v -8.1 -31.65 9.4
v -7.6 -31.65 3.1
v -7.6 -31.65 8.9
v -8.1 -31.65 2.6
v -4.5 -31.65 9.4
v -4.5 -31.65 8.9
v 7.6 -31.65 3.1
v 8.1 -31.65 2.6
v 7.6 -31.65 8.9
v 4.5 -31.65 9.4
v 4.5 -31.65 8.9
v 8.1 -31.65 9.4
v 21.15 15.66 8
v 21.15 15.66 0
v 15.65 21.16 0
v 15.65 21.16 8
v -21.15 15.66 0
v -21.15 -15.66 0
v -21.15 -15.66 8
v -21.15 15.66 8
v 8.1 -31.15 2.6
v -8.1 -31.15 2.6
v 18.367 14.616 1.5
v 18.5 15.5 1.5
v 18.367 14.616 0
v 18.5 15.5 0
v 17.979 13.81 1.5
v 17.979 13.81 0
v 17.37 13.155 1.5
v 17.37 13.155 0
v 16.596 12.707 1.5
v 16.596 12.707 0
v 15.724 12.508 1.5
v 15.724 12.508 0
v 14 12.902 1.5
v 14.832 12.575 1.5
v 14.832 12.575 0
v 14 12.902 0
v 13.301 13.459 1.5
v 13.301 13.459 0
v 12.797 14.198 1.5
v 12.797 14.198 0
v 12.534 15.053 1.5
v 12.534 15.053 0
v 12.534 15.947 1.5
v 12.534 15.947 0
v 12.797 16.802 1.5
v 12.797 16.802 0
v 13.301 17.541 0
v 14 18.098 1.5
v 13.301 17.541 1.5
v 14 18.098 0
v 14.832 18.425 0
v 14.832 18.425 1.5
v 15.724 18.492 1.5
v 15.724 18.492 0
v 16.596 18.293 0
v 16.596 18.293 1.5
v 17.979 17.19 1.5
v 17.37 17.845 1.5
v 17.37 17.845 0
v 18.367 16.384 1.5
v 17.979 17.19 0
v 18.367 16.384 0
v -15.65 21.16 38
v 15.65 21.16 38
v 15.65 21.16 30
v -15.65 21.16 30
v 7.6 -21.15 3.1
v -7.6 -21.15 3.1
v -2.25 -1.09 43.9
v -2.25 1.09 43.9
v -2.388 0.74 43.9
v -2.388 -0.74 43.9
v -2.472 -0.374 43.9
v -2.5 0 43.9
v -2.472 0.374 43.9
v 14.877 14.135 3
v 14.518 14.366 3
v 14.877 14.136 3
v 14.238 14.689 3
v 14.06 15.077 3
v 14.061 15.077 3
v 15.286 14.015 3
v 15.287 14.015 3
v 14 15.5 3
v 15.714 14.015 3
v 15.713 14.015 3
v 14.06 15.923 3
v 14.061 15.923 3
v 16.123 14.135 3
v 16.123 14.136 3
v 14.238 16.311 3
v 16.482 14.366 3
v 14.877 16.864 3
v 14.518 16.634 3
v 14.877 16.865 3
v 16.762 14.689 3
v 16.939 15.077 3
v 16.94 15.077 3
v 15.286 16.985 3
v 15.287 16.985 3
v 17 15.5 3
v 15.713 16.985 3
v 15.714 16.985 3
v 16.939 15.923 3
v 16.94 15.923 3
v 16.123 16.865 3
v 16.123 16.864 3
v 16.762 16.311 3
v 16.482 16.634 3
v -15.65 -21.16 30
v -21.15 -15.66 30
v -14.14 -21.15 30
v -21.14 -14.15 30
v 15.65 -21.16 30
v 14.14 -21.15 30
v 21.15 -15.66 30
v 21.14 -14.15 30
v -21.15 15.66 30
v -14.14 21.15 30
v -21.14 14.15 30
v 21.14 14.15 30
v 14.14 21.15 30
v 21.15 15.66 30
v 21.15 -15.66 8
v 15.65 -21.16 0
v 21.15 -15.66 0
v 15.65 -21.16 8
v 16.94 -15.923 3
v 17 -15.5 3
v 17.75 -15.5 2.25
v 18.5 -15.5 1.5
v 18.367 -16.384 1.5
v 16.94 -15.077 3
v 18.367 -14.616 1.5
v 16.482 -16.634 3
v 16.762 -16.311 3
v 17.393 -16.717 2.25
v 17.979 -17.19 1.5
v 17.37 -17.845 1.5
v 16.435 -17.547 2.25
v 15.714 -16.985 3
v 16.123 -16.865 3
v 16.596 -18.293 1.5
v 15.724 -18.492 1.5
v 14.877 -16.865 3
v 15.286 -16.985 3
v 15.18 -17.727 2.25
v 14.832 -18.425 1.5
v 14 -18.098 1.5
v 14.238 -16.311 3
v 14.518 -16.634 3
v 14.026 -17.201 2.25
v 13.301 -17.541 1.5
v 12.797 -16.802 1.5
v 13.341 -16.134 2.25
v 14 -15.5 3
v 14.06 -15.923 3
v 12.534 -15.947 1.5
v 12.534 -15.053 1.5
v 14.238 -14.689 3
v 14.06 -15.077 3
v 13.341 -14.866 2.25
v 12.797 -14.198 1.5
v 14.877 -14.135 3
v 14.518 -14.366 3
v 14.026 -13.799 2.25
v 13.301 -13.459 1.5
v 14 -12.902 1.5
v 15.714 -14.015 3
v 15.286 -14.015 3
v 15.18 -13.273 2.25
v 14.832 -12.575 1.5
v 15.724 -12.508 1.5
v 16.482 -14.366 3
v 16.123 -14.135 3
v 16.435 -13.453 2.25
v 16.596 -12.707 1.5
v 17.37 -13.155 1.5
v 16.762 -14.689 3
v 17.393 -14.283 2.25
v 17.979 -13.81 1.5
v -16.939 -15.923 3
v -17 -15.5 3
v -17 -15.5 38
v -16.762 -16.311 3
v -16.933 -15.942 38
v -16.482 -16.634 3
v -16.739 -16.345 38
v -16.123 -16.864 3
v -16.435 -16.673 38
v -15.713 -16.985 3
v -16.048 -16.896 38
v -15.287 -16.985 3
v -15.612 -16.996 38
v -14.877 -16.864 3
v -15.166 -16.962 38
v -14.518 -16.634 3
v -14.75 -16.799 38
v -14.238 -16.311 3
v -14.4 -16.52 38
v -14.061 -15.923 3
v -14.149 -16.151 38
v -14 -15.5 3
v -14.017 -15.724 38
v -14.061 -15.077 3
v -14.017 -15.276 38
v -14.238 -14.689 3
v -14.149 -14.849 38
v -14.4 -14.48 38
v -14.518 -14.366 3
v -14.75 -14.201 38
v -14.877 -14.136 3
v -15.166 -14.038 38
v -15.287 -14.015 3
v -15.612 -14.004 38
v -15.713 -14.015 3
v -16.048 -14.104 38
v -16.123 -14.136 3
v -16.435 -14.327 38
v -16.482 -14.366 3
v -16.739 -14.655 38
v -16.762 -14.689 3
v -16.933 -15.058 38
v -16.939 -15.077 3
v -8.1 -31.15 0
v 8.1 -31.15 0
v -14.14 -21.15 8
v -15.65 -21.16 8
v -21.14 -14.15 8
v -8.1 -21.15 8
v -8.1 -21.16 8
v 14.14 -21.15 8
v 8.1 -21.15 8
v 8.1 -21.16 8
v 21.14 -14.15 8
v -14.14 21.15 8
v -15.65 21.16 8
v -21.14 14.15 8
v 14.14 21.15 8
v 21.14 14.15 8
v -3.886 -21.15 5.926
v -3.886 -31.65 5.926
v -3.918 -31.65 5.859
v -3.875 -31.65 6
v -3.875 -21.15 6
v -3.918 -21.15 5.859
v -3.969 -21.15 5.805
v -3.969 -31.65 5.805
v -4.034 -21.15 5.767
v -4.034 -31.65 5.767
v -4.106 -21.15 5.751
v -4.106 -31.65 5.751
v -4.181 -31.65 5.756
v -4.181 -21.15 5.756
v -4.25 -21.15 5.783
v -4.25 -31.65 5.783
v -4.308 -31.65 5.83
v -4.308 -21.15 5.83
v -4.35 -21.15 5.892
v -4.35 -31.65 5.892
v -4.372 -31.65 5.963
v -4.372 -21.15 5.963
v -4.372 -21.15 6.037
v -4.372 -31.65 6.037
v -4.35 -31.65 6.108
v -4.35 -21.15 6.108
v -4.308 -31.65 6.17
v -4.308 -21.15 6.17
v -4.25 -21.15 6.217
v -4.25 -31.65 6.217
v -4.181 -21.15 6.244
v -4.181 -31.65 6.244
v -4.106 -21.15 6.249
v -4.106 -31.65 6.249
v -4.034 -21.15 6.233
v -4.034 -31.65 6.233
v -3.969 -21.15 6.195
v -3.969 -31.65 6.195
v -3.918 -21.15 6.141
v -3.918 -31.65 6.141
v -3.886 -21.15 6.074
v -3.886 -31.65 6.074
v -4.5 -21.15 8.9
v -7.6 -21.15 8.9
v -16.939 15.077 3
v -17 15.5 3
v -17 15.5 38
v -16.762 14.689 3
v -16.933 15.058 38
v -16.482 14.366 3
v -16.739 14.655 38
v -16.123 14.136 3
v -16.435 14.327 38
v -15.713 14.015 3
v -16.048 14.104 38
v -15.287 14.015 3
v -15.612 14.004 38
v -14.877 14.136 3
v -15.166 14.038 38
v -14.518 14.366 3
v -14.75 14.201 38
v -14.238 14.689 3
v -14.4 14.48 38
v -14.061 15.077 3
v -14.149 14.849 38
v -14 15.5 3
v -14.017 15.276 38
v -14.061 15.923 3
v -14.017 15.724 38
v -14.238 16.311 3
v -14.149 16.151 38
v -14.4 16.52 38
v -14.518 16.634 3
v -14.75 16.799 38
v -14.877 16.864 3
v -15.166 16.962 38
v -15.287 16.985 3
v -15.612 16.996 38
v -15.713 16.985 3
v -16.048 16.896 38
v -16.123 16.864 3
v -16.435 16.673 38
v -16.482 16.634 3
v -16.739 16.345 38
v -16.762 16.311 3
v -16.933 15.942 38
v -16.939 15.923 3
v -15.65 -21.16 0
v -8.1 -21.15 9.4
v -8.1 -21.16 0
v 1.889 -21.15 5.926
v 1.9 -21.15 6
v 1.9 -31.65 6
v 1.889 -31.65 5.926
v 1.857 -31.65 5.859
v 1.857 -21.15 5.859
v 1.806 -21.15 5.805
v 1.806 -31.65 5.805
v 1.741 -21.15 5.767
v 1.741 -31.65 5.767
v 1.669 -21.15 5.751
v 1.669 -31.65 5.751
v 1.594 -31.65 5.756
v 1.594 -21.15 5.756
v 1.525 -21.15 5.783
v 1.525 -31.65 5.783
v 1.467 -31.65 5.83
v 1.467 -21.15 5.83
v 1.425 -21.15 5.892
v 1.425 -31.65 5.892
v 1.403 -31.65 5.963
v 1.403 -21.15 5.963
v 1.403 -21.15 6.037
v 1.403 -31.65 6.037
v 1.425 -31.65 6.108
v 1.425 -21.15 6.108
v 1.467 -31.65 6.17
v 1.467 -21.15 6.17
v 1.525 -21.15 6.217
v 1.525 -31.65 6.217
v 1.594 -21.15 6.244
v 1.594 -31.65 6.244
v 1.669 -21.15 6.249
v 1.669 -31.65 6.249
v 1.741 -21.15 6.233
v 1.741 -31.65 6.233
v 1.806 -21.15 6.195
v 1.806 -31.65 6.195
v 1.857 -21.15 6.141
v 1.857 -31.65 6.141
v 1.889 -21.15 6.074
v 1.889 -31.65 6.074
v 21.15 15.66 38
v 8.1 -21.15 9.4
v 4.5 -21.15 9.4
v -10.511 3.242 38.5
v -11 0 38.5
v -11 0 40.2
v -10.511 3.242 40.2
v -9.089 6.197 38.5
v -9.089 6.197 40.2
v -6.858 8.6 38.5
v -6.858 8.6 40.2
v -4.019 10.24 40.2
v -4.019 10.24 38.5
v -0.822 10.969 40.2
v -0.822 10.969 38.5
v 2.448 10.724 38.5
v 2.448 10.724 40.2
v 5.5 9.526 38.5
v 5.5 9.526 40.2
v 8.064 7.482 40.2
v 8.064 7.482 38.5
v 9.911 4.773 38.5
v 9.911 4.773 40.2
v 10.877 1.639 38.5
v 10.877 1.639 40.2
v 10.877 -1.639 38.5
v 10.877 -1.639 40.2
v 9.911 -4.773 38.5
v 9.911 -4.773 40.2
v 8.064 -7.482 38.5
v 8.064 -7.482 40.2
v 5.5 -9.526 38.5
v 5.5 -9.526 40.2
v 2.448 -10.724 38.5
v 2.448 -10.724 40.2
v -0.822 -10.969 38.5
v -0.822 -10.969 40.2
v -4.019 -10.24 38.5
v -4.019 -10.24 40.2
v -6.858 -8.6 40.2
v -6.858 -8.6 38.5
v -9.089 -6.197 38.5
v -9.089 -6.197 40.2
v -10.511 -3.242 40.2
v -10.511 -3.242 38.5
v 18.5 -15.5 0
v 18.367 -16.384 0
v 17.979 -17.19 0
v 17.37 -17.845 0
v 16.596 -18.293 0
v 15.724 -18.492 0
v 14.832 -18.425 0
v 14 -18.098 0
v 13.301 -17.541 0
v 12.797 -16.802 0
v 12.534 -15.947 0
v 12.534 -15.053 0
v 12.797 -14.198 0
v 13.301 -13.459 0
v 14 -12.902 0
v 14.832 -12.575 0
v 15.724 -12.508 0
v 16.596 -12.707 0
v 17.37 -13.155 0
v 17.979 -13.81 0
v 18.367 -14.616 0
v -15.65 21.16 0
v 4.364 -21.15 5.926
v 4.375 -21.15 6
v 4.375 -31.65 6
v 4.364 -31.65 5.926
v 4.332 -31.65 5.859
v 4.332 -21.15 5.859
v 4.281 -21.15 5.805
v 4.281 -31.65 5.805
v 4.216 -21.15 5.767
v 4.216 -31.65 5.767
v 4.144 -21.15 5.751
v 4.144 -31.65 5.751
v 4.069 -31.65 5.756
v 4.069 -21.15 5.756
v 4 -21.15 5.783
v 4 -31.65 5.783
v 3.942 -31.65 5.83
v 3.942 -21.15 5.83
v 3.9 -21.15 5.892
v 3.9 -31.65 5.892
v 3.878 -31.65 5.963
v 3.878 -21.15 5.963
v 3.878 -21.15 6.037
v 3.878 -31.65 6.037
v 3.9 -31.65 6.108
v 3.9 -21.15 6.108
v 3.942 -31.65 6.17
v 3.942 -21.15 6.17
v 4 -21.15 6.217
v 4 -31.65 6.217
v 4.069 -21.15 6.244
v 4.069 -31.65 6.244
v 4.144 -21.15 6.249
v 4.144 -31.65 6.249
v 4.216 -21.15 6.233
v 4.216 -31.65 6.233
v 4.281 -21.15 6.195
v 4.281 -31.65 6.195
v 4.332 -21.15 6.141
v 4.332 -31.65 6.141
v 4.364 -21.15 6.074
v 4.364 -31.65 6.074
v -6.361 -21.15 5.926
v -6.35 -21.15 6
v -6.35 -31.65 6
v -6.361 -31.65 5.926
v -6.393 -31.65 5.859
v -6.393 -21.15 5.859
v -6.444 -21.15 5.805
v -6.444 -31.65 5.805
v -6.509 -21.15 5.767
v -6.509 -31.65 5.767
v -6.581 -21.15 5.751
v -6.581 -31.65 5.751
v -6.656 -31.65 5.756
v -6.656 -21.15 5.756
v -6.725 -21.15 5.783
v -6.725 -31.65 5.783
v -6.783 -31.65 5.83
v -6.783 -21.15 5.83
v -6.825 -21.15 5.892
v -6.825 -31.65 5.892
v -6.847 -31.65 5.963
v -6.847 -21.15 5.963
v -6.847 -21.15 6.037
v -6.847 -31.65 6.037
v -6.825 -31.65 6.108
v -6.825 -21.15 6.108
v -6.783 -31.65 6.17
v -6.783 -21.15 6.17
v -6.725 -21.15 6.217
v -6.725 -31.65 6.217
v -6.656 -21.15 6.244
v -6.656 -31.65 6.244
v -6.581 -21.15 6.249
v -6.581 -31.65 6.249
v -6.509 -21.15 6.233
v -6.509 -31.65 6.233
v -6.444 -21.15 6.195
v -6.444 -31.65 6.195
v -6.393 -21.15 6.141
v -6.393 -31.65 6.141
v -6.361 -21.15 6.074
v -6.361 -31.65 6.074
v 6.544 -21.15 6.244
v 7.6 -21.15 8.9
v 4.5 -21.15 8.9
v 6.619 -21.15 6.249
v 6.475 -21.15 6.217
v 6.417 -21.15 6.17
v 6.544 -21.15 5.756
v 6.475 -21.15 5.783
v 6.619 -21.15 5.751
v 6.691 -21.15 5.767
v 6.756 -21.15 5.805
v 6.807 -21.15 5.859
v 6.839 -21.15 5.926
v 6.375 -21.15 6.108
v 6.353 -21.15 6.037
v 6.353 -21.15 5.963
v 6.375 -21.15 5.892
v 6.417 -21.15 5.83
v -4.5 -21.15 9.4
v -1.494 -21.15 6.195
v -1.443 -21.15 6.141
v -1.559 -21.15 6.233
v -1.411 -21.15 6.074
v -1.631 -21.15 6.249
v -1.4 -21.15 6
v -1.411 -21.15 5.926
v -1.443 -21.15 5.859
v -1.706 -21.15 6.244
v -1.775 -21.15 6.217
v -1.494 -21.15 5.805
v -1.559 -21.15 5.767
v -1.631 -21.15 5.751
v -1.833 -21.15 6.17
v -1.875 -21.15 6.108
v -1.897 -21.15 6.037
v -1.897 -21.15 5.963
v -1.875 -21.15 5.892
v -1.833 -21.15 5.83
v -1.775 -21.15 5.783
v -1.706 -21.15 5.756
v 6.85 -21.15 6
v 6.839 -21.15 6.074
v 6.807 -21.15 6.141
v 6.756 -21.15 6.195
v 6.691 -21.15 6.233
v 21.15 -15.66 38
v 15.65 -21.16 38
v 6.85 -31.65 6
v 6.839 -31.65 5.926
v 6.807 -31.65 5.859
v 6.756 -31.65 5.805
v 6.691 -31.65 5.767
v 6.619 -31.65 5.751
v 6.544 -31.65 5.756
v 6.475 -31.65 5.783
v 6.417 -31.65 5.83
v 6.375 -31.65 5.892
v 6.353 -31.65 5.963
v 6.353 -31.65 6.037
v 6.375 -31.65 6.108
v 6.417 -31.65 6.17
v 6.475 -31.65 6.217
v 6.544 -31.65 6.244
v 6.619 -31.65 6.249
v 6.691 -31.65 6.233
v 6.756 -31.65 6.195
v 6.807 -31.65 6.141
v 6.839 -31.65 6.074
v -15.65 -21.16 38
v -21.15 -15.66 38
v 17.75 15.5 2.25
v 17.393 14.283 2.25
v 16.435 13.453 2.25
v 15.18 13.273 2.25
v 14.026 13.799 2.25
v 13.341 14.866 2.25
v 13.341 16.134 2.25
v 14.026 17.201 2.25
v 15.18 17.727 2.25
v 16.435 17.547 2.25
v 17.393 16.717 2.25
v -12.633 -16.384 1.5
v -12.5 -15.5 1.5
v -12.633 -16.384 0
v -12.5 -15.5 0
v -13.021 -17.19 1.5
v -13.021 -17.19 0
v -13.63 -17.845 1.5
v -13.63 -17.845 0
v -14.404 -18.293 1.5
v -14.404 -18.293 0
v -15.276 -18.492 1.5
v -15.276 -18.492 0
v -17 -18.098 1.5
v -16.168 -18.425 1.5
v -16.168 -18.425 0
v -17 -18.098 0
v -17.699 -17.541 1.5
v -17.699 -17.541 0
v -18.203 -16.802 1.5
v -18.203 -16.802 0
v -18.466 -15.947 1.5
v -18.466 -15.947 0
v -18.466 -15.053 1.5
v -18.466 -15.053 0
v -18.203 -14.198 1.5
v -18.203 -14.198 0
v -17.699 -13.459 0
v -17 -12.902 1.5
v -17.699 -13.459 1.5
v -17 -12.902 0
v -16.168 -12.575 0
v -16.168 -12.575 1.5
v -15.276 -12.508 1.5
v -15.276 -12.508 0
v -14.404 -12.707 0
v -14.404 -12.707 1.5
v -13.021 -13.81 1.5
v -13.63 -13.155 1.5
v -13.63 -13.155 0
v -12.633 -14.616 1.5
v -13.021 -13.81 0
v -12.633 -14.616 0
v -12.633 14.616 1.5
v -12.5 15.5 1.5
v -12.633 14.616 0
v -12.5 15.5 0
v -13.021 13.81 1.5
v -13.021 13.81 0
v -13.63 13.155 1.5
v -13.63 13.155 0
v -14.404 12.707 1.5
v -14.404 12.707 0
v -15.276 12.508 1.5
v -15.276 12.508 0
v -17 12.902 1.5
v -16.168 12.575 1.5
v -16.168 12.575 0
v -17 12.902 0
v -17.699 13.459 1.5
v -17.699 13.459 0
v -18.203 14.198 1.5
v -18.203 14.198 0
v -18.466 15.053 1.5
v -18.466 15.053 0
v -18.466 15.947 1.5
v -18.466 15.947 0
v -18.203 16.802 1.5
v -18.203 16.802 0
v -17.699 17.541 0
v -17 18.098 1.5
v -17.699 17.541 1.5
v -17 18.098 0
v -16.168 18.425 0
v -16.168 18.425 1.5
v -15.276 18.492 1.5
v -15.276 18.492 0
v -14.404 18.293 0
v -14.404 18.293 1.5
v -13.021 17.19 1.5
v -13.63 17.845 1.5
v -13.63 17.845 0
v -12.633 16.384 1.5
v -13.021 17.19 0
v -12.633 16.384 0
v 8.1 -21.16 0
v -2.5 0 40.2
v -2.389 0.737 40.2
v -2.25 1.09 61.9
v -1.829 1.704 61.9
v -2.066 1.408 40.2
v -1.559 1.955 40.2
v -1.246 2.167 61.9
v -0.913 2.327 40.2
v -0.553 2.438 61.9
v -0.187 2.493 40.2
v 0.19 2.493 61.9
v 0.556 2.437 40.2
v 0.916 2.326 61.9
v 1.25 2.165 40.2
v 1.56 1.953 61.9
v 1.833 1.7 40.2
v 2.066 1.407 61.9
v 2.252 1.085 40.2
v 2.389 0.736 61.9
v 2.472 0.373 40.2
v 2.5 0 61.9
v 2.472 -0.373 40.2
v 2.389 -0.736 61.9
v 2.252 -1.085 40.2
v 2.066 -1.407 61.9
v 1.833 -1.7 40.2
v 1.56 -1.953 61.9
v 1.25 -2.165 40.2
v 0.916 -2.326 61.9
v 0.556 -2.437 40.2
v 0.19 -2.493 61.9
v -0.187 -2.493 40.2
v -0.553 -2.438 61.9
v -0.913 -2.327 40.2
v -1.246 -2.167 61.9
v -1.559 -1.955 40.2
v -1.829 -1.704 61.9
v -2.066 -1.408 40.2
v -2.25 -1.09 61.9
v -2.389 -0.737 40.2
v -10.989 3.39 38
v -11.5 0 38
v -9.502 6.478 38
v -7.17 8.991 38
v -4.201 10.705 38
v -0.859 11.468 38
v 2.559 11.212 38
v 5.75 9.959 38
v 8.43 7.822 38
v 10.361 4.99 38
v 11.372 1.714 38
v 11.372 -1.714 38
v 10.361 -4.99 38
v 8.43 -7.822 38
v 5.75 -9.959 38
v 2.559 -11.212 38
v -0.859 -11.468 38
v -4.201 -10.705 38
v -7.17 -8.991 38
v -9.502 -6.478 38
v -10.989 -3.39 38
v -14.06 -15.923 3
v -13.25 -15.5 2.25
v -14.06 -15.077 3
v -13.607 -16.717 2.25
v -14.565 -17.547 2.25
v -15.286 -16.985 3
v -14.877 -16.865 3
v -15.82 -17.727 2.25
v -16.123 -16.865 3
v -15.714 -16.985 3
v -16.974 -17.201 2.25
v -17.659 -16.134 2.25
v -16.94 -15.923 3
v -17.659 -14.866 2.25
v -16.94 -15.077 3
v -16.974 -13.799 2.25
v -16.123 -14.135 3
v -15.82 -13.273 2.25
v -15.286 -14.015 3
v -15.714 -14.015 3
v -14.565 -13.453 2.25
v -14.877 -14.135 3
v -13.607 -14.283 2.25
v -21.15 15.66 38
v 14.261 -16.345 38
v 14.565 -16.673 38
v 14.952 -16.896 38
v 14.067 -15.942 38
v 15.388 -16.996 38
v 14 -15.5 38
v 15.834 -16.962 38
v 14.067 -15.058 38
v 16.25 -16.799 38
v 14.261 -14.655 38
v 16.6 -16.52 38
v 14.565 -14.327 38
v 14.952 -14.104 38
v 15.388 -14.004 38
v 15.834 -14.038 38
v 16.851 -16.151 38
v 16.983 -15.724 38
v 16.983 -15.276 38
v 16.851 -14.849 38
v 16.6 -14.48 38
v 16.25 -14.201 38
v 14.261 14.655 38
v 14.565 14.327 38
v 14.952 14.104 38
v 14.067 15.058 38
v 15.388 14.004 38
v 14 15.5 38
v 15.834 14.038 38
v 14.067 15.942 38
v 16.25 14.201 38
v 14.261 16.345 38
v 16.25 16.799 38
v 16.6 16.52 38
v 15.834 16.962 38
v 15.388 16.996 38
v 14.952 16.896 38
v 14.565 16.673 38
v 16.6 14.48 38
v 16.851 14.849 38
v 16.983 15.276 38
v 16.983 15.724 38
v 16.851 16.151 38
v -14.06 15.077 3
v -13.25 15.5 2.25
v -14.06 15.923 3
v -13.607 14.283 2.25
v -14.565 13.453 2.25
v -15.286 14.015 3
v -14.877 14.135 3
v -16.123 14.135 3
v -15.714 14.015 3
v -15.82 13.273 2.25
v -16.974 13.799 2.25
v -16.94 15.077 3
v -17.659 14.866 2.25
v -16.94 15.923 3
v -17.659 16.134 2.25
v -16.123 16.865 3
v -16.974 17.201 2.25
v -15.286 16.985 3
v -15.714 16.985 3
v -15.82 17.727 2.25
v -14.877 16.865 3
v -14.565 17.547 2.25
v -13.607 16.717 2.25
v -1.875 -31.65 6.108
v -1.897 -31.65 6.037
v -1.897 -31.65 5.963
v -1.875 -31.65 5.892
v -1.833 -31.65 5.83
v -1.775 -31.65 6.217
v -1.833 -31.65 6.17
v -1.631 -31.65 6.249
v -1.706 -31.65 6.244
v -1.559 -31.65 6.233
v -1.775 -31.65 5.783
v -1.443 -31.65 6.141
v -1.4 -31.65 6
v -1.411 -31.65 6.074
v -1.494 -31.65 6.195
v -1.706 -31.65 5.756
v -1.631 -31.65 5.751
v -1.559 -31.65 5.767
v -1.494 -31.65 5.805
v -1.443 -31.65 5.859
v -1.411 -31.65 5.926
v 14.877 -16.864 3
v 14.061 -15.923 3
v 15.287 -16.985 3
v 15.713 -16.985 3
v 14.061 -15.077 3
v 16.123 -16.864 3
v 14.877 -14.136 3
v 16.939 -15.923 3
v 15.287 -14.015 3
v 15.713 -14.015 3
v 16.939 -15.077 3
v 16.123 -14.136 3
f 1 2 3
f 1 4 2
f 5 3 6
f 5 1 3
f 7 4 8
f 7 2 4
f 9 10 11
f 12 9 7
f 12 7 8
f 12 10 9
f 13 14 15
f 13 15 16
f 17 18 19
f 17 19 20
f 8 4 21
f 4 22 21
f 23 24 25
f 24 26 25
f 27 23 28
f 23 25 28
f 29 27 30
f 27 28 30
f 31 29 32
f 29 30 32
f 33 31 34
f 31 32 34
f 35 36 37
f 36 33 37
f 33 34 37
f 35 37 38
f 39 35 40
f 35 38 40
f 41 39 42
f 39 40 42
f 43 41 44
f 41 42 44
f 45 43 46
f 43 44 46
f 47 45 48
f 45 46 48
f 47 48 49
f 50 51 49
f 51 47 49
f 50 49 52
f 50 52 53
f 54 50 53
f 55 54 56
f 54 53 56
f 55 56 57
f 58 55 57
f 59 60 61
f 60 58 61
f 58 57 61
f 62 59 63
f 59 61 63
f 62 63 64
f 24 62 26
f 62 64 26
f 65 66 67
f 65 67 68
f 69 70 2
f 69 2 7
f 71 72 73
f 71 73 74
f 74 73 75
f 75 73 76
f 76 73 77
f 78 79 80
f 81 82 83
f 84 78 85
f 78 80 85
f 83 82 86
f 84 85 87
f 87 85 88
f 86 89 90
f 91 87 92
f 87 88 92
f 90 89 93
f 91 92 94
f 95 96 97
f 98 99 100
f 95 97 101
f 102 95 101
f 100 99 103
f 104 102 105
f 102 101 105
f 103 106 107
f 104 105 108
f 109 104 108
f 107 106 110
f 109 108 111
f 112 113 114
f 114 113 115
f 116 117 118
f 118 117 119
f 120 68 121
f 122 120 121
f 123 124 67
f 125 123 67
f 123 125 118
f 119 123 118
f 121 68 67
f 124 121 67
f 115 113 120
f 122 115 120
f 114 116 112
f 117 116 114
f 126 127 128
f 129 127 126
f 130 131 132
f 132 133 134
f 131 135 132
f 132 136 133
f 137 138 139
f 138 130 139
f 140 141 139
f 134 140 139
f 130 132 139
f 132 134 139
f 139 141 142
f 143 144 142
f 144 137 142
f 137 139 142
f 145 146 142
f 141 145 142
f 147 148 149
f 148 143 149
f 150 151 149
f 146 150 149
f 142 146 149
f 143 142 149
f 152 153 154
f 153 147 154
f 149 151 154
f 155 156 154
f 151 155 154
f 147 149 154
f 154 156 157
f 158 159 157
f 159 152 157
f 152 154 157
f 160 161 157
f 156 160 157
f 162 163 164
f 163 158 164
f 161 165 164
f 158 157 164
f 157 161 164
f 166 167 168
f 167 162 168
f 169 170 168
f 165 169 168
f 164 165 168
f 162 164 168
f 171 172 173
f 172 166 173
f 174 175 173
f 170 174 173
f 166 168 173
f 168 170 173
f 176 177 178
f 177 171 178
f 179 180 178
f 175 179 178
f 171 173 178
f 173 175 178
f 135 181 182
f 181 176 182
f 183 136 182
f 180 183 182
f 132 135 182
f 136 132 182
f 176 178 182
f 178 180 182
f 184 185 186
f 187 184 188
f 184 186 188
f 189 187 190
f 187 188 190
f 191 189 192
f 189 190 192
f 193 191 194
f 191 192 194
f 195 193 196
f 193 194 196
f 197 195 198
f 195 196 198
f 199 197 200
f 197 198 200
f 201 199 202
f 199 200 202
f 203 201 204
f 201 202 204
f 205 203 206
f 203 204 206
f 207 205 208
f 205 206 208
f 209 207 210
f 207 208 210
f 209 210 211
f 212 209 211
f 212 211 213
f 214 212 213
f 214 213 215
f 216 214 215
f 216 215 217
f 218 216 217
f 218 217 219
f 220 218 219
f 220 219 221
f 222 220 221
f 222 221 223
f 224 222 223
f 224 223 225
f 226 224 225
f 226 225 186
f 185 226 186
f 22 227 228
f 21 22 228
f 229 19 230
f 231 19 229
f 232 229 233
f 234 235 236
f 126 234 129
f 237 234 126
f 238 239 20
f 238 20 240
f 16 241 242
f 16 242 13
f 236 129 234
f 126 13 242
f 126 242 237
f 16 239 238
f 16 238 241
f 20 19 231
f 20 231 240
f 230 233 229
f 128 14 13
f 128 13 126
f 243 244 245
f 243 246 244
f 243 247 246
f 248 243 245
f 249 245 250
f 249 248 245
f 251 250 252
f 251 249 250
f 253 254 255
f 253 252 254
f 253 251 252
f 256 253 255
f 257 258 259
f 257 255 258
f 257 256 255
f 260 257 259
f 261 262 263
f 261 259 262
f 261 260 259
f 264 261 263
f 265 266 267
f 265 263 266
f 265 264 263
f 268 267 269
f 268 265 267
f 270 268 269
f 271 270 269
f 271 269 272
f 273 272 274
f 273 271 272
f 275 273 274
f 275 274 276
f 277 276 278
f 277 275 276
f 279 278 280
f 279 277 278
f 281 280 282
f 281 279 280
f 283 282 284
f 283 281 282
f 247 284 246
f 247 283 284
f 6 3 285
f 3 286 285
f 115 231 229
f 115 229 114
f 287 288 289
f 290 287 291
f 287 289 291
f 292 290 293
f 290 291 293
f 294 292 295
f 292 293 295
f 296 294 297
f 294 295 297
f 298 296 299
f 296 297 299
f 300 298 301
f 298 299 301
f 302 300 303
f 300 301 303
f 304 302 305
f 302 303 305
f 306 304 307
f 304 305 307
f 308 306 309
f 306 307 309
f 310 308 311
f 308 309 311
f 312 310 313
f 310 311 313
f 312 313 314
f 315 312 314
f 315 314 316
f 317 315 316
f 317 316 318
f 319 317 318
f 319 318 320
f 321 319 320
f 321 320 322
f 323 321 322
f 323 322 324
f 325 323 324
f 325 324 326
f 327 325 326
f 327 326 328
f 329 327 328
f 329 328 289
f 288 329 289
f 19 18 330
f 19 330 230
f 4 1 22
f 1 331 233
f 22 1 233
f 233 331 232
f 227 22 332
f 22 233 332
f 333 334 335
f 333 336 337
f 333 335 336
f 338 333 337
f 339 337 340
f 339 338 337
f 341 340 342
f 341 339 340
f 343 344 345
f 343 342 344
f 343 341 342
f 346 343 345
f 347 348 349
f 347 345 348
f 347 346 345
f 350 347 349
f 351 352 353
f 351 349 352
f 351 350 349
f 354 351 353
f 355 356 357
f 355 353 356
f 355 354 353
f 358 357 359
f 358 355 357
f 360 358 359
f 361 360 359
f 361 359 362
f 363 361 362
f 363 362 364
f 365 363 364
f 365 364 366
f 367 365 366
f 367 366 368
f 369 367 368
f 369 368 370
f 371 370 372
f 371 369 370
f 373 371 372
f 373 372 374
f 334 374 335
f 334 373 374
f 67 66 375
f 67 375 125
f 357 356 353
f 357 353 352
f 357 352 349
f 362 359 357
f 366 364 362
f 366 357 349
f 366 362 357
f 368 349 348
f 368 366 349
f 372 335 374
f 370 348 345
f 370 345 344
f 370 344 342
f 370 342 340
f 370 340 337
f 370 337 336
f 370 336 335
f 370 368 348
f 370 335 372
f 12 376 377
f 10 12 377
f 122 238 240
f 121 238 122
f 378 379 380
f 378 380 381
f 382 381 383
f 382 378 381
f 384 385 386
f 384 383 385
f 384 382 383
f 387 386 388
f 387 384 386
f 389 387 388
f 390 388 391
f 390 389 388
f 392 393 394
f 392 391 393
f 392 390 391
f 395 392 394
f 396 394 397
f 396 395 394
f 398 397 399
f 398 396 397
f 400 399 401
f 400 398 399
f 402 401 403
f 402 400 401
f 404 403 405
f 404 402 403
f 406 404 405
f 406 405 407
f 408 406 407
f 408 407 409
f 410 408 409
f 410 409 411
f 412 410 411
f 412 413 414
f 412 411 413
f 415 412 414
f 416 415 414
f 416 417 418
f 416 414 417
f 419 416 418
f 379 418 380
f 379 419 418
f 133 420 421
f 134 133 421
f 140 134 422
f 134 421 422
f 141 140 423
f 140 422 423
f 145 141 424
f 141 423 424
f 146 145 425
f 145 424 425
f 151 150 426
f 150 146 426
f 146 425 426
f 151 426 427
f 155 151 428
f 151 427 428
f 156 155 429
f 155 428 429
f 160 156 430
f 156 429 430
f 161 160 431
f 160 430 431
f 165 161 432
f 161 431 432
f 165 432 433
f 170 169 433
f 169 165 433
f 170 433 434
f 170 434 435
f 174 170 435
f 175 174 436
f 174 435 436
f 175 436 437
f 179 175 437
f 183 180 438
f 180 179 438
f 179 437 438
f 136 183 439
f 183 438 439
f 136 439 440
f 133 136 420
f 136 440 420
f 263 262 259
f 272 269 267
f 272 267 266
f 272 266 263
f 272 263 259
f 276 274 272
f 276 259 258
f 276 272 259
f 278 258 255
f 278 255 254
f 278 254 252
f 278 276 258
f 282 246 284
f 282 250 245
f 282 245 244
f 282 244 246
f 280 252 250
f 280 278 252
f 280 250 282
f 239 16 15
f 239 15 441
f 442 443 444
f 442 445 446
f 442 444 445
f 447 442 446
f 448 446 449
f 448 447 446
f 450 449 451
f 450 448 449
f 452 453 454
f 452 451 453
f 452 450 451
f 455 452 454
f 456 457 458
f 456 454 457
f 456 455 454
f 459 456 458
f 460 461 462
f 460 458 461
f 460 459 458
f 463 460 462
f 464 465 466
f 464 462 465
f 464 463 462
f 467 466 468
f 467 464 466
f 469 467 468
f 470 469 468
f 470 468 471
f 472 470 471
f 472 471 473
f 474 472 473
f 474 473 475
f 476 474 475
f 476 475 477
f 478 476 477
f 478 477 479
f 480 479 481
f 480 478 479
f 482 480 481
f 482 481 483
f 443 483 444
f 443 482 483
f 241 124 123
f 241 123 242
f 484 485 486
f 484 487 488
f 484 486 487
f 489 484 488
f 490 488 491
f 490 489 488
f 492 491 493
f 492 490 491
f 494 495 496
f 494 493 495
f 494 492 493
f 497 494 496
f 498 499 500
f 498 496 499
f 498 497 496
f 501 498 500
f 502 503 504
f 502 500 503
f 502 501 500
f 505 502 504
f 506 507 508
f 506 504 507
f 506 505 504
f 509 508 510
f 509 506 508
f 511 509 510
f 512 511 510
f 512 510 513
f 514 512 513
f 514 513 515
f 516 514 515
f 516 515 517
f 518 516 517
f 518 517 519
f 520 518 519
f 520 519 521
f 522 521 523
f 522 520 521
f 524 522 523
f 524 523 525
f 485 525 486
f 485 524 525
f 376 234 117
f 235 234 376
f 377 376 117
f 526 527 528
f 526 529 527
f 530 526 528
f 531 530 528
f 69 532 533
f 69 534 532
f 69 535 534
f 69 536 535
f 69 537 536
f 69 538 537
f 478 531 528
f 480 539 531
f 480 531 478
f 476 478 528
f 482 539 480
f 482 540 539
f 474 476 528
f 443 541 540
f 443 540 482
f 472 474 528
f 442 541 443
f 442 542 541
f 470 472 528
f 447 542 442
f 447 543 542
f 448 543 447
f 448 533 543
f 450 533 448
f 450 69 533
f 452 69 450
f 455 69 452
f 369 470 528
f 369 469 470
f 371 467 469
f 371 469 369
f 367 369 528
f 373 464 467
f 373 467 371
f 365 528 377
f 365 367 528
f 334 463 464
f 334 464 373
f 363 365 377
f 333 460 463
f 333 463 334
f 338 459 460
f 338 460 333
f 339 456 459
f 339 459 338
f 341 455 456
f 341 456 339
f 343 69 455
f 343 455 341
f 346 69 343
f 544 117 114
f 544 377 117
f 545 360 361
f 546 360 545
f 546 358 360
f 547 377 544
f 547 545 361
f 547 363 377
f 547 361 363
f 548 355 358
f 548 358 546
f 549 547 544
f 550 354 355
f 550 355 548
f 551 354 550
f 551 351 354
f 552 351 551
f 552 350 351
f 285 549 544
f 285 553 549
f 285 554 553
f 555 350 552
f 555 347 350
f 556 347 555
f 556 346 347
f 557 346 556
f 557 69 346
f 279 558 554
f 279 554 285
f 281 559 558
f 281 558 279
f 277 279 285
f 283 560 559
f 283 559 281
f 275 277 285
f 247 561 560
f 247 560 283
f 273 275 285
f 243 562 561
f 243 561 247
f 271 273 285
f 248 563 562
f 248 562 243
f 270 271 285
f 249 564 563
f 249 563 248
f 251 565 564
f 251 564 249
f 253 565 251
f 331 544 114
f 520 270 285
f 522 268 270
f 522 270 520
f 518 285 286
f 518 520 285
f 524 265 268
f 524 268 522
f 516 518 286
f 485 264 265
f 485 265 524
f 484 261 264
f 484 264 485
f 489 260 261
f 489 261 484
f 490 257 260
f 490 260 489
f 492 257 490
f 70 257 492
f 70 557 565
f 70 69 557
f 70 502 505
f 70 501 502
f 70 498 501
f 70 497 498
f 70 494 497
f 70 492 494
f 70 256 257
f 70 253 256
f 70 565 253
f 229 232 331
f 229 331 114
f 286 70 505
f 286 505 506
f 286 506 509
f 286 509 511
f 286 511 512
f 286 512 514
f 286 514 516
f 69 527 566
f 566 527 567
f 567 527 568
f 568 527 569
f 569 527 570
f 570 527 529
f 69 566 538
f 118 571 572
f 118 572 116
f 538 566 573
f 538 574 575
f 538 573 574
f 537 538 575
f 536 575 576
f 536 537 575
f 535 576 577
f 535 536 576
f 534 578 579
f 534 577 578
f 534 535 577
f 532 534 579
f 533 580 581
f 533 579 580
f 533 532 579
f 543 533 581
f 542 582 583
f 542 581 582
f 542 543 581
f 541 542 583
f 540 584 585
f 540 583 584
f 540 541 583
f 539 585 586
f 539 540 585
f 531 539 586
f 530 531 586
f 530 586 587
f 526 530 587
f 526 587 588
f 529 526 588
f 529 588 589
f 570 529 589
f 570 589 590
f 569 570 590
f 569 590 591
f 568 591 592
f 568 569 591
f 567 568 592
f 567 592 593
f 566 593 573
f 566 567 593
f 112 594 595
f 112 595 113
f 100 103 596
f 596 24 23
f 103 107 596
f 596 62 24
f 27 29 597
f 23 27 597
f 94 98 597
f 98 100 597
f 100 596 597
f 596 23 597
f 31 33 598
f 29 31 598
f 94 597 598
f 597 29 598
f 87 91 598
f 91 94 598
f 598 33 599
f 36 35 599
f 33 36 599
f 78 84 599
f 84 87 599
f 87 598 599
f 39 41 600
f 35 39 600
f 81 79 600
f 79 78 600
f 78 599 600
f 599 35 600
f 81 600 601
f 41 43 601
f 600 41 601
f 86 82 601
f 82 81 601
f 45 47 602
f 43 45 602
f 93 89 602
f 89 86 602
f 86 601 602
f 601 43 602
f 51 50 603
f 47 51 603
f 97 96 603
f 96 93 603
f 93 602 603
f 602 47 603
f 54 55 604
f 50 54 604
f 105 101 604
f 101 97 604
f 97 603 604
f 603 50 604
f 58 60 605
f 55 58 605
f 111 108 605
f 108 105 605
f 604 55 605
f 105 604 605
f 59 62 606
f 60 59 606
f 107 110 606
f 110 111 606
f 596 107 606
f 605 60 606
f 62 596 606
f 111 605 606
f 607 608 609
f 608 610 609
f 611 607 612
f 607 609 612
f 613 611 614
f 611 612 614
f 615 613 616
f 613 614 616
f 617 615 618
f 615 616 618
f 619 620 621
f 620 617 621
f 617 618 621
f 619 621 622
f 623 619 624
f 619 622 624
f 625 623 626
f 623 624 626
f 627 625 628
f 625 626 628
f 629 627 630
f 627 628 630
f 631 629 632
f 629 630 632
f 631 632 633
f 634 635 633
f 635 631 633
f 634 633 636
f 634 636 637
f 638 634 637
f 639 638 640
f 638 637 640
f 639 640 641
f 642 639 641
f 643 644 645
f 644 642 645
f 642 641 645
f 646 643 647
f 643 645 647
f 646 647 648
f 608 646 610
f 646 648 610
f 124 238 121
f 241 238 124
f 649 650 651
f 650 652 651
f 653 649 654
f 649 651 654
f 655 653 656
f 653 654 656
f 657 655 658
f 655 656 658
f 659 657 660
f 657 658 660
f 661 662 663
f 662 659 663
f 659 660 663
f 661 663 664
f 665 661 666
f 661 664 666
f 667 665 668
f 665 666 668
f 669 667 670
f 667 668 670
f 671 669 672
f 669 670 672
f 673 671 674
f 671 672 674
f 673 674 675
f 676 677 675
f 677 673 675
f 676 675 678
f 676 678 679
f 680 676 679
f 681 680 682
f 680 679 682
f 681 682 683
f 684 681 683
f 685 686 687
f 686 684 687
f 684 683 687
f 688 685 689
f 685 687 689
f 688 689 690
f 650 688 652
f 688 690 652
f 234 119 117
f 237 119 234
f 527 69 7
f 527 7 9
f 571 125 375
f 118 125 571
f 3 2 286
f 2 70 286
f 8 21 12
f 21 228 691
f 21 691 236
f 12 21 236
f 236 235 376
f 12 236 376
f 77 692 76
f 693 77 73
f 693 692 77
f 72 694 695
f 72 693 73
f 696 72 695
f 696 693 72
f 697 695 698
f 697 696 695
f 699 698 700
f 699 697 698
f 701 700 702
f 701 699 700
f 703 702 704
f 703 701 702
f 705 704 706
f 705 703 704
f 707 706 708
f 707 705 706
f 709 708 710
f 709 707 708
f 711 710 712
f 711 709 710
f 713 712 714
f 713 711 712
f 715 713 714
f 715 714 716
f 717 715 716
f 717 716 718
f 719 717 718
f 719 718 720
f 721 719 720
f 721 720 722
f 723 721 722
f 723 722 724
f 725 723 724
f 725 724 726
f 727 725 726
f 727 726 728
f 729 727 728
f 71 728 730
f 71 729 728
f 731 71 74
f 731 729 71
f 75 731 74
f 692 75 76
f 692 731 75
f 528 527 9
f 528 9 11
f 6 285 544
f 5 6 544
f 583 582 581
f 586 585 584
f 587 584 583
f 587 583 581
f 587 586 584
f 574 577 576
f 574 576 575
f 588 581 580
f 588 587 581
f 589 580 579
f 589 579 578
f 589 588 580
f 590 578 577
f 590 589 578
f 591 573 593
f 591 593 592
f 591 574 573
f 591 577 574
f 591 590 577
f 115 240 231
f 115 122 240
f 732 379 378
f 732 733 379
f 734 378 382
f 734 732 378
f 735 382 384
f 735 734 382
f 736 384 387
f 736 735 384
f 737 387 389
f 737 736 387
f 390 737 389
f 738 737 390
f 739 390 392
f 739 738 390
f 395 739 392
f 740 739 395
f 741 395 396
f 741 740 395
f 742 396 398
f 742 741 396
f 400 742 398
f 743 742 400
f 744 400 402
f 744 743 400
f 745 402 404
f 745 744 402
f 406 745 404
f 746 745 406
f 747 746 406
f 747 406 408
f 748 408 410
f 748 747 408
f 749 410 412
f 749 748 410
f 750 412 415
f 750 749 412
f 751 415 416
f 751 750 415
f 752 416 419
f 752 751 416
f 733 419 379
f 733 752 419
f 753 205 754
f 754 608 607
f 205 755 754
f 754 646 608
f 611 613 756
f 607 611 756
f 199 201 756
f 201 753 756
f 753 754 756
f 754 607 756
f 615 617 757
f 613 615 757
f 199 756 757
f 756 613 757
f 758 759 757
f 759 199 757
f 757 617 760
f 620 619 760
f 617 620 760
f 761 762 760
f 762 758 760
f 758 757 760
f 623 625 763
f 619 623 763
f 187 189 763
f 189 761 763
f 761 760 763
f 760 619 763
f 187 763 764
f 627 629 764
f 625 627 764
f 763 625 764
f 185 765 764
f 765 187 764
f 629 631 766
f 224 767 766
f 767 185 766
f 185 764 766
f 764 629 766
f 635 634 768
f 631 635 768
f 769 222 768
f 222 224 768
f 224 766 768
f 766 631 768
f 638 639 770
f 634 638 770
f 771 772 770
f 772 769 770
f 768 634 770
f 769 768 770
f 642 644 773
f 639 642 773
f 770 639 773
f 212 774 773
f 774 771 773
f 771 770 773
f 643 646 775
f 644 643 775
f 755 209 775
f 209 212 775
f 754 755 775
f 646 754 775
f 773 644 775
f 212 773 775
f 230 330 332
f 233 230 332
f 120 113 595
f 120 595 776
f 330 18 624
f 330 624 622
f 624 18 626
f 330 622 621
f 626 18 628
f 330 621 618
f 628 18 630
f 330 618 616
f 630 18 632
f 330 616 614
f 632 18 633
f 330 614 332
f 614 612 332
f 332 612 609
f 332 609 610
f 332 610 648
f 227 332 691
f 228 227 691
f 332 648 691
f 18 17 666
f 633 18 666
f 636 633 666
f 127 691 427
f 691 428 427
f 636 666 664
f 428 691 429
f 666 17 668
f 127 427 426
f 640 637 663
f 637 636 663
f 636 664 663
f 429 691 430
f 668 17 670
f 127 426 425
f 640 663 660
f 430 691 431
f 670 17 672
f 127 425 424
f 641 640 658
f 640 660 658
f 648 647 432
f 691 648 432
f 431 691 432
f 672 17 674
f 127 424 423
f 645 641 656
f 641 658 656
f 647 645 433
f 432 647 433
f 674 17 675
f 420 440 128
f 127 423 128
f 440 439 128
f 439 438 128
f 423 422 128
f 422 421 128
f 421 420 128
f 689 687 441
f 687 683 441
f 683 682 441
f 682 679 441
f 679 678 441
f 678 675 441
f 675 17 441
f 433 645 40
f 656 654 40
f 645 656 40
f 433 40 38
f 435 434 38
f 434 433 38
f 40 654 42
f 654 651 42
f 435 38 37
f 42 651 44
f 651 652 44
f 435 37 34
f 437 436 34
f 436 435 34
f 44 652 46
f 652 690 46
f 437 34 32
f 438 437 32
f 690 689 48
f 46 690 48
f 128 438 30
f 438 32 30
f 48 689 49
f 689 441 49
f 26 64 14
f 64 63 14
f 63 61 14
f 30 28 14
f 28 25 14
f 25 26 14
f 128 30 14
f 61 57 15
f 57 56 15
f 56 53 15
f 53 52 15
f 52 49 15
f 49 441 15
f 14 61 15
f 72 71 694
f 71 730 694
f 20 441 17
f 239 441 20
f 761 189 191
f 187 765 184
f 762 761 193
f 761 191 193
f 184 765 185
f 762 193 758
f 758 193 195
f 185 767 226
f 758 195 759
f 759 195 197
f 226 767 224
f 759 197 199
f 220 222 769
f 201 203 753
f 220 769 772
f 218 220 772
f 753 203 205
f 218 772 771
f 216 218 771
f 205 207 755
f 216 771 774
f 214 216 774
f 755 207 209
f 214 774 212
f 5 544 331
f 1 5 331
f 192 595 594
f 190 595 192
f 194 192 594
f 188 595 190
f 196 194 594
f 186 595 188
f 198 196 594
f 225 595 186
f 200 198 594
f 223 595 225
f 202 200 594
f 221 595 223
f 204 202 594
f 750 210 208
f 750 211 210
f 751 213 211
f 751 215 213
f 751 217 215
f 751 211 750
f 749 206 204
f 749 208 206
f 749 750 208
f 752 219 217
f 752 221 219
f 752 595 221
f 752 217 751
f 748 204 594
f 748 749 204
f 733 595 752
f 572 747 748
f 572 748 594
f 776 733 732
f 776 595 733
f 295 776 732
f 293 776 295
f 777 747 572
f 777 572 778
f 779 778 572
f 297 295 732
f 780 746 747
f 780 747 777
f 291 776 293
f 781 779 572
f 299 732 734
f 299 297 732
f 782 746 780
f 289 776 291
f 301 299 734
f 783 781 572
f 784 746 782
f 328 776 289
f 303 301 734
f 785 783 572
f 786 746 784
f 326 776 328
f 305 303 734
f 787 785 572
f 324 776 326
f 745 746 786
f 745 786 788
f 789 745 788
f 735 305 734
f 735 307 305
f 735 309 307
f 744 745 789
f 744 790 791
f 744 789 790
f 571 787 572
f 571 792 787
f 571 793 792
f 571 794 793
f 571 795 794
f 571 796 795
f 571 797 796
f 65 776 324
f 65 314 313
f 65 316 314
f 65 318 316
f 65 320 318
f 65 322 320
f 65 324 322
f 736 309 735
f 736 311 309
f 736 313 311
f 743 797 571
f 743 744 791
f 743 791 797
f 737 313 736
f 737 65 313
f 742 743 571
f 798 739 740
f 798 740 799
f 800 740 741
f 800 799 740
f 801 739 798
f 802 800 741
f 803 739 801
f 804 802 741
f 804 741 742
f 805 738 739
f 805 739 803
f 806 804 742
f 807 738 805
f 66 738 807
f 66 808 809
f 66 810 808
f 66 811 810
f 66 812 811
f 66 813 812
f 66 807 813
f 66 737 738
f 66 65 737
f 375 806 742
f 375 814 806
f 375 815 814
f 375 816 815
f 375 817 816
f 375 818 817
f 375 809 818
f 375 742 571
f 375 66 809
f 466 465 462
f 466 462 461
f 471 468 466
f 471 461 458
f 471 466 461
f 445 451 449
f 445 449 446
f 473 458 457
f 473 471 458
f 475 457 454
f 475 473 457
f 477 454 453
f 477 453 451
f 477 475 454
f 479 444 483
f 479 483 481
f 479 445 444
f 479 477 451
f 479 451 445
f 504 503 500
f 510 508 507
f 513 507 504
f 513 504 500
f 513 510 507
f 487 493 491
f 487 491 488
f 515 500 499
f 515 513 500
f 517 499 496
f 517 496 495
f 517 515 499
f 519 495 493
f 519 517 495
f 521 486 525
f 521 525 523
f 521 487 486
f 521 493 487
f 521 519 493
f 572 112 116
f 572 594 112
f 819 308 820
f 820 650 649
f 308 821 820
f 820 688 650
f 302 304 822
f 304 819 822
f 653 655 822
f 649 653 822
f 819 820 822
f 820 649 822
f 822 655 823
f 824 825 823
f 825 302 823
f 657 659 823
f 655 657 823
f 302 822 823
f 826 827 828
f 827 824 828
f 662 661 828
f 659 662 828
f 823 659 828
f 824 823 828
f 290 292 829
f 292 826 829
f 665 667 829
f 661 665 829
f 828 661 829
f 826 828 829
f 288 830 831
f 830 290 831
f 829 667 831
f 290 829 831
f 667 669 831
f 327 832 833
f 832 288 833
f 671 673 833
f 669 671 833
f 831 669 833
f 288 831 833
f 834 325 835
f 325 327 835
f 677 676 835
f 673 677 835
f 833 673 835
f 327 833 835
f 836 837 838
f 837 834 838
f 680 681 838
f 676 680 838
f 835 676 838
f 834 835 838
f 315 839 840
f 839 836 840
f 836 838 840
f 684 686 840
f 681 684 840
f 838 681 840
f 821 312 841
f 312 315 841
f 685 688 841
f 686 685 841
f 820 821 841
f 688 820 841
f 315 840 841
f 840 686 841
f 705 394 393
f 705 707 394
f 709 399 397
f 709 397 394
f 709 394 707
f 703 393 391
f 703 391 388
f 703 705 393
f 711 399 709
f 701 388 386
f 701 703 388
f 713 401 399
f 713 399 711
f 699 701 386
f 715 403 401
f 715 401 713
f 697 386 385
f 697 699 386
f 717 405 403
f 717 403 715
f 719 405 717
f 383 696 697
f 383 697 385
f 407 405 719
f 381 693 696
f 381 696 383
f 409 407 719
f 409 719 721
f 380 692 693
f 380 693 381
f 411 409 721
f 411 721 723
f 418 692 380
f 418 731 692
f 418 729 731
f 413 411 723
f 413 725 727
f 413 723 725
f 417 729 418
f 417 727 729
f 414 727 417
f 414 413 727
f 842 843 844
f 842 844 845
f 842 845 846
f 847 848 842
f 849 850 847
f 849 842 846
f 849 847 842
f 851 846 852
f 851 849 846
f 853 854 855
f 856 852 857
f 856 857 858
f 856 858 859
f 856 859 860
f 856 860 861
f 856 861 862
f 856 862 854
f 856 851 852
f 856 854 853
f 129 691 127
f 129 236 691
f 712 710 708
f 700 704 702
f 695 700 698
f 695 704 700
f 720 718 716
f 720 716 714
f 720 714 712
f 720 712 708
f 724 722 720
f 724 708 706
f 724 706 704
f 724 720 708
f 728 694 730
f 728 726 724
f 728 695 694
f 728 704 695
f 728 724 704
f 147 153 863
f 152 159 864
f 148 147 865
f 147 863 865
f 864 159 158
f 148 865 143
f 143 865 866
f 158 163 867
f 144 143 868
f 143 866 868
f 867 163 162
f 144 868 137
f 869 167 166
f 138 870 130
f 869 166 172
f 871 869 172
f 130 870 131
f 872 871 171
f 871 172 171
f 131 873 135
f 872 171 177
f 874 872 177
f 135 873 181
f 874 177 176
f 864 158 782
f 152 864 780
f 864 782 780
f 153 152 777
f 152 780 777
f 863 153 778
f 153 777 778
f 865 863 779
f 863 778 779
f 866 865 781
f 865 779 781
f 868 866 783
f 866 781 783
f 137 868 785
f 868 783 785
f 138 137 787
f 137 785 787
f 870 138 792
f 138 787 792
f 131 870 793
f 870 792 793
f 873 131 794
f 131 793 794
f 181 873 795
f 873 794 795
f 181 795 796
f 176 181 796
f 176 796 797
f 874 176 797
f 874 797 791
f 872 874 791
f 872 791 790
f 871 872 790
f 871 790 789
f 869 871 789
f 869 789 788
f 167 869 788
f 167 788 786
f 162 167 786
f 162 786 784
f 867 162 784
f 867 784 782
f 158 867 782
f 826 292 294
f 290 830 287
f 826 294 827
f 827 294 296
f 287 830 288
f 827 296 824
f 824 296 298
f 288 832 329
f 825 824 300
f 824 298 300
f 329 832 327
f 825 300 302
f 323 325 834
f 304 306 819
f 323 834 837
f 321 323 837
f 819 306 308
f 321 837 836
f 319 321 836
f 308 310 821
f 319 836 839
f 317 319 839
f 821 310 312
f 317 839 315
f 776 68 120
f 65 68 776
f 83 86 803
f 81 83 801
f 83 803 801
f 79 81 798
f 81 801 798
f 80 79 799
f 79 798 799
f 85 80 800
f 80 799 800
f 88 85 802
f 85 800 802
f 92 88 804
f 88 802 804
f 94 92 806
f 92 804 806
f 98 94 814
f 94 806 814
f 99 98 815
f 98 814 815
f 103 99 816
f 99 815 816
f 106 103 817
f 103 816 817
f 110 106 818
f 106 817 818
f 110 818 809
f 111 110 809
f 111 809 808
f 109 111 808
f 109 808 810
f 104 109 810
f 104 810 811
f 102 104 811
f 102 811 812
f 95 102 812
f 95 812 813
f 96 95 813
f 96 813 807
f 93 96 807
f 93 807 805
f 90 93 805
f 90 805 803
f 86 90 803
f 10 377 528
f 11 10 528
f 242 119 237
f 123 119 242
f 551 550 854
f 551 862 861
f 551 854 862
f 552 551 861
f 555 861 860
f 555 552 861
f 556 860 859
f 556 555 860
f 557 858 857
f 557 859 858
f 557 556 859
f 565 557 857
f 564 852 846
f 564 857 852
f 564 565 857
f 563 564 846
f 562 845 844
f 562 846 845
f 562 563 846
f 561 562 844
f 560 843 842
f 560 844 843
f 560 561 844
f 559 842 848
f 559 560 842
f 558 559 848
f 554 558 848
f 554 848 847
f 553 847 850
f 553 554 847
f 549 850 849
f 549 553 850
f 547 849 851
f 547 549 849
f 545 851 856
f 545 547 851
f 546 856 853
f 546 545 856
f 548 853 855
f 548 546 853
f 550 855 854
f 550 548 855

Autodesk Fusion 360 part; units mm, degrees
sketch "Sketch1" plane through (0, 0, 0) normal (0, 0, 1) x (1, 0, 0)
  line L0 (21.15, -21.15) -> (-21.15, -21.15)
  line L1 (-21.15, -21.15) -> (-21.15, 21.15)
  line L2 (-21.15, 21.15) -> (21.15, 21.15)
  line L3 (21.15, 21.15) -> (21.15, -21.15)
  line L4 (21.15, -21.15) -> (-21.15, 21.15) construction
  line L5 (-21.15, -21.15) -> (21.15, 21.15) construction
  line L6 (-8.1, -21.15) -> (8.1, -21.15)
  line L7 (-8.1, -21.15) -> (-8.1, -31.15)
  line L8 (-8.1, -31.15) -> (8.1, -31.15)
  line L9 (8.1, -31.15) -> (8.1, -21.15)
  line L10 (15.5, 15.5) -> (-15.5, 15.5) construction
  line L11 (-15.5, 15.5) -> (-15.5, -15.5) construction
  line L12 (-15.5, -15.5) -> (15.5, -15.5) construction
  line L13 (15.5, -15.5) -> (15.5, 15.5) construction
  line L14 (15.5, 15.5) -> (-15.5, -15.5) construction
  line L15 (-15.5, 15.5) -> (15.5, -15.5) construction
  circle A0 centre (-15.5, -15.5) radius 3
  circle A1 centre (15.5, -15.5) radius 3
  line L16 (1.75, 0) -> (22.5, 0)
  circle A2 centre (15.5, 15.5) radius 3
  circle A3 centre (-15.5, 15.5) radius 3
  dimension "d1" = 42.3
  dimension "d2" = 42.3
  dimension "d5" = 10
  dimension "d6" = 16.2
  dimension "d7" = 13.05
  dimension "d23" = 31
  dimension "d24" = 31
  dimension "d25" = 6
  dimension "d26" = 6
extrude "Extrude1" add sketch "Sketch1" along normal blind 38 contours L0 L1 L2 L3 L6 | A0 | A1 | A2 | A3
extrude "Extrude2" add sketch "Sketch1" along normal blind 9.4 contours L0 L6 L7 L8 L9
sketch "Sketch2" plane through (0, 0, 38) normal (0, 0, 1) x (-1, 0, 0)
  line L0 (21.15, 21.15) -> (-21.15, 21.15)
  line L1 (-21.15, 21.15) -> (-21.15, -21.15)
  line L2 (-21.15, -21.15) -> (21.15, -21.15)
  line L3 (21.15, -21.15) -> (21.15, 21.15)
  circle A0 centre (0, 0) radius 2.5
  dimension "d12" = 5
extrude "Extrude3" add sketch "Sketch2" along normal blind 23.9 contours A0
sketch "Sketch3" plane through (0, 0, 38) normal (0, 0, 1) x (-1, 0, 0)
  circle A0 centre (0, 0) radius 2.5
  line L0 (21.15, 21.15) -> (-21.15, 21.15)
  line L1 (-21.15, 21.15) -> (-21.15, -21.15)
  line L2 (-21.15, -21.15) -> (21.15, -21.15)
  line L3 (21.15, -21.15) -> (21.15, 21.15)
  line L4 (-15.5, 15.5) -> (15.5, 15.5) construction
  line L5 (15.5, 15.5) -> (15.5, -15.5) construction
  line L6 (15.5, -15.5) -> (-15.5, -15.5) construction
  line L7 (-15.5, -15.5) -> (-15.5, 15.5) construction
  line L8 (-15.5, 15.5) -> (15.5, -15.5) construction
  line L9 (15.5, 15.5) -> (-15.5, -15.5) construction
  circle A1 centre (15.5, -15.5) radius 1.5
  circle A2 centre (-15.5, -15.5) radius 1.5
  circle A3 centre (-15.5, 15.5) radius 1.5
  circle A4 centre (15.5, 15.5) radius 1.5
  circle A5 centre (0, 0) radius 11
  dimension "d15" = 31
  dimension "d16" = 31
  dimension "d17" = 3
  dimension "d18" = 3
  dimension "d19" = 3
  dimension "d20" = 3
  dimension "d30" = 22
extrude "Extrude4" cut sketch "Sketch3" against normal up to surface (38 mm away) contours A1 | A2 | A3 | A4
extrude "Extrude5" cut sketch "Sketch1" along normal blind 3 contours A0 | A1 | A2 | A3
chamfer "Chamfer1" distance 1.5 angle 45 4 edges at (12.703, -16.5848, 3) (-18.297, -16.5848, 3) (12.703, 14.4152, 3) (-18.297, 14.4152, 3)
extrude "Extrude6" add sketch "Sketch3" along normal blind 2.2 contours A5
sketch "Sketch4" plane through (0, 0, 61.9) normal (0, 0, 1) x (-1, 0, 0)
  circle A0 centre (0, 0) radius 2.5
  line L0 (0, 0) -> (2.25, 0)
  line L1 (2.25, 0) -> (2.25, -2.5)
  line L2 (2.25, -2.5) -> (2.25, 0)
  line L3 (2.25, 0) -> (2.25, 2.5)
  dimension "d34" = 2.25
extrude "Extrude7" cut sketch "Sketch4" against normal blind 18 contours A0 L1 L2 L3 picked at (2.4114, -0.0938)
chamfer "Chamfer3" distance 0.5 angle 45 1 edges at (10.2556, -3.9778, 38)
sketch "Sketch5" plane through (0, -31.15, 0) normal (0, -1, 0) x (1, 0, 0)
  line L0 (-8.1, 0) -> (8.1, 0)
  line L1 (8.1, 0) -> (8.1, 9.4)
  line L2 (8.1, 9.4) -> (-8.1, 9.4)
  line L3 (-8.1, 9.4) -> (-8.1, 0)
  line L4 (-8.1, 0) -> (-8.1, 2.6)
  line L5 (-8.1, 2.6) -> (8.1, 2.6)
  line L6 (8.1, 2.6) -> (8.1, 0)
  line L7 (8.1, 0) -> (-8.1, 0)
  line L8 (8.1, 2.6) -> (8.1, 9.4)
  line L9 (8.1, 9.4) -> (4.5, 9.4)
  line L10 (-8.1, 2.6) -> (-8.1, 9.4)
  line L11 (-8.1, 9.4) -> (-4.5, 9.4)
  line L12 (-7.6, 8.9) -> (-4.5, 8.9)
  line L13 (-7.6, 3.1) -> (-7.6, 8.9)
  line L14 (-7.6, 3.1) -> (7.6, 3.1)
  line L15 (7.6, 3.1) -> (7.6, 8.9)
  line L16 (7.6, 8.9) -> (4.5, 8.9)
  line L17 (-4.5, 8.9) -> (-4.5, 9.4)
  line L18 (4.5, 9.4) -> (4.5, 8.9)
  dimension "d38" = 2.6
  dimension "d39" = 3.6
  dimension "d40" = -0.5
extrude "Extrude8" cut sketch "Sketch5" against normal up to surface (10 mm away) contours L2 L12 L13 L14 L15 L16 L17 L18
extrude "Extrude9" add sketch "Sketch5" along normal blind 0.5 contours L1 L2 L3 L5 L8 L9 L10 L11 L12 L13 L14 L15 L16 L17 L18
sketch "Sketch6" plane through (0, -21.15, 0) normal (0, -1, 0) x (1, 0, 0)
  line L0 (21.15, 38) -> (-21.15, 38)
  line L1 (8.1, 0) -> (21.15, 0)
  line L2 (-8.1, 0) -> (-8.1, 9.4)
  line L3 (-8.1, 9.4) -> (-4.5, 9.4)
  line L4 (-4.5, 9.4) -> (-4.5, 8.9)
  line L5 (-4.5, 8.9) -> (-7.6, 8.9)
  line L6 (-7.6, 8.9) -> (-7.6, 3.1)
  line L7 (-7.6, 3.1) -> (7.6, 3.1)
  line L8 (7.6, 3.1) -> (7.6, 8.9)
  line L9 (7.6, 8.9) -> (4.5, 8.9)
  line L10 (4.5, 8.9) -> (4.5, 9.4)
  line L11 (4.5, 9.4) -> (8.1, 9.4)
  line L12 (8.1, 9.4) -> (8.1, 0)
  line L13 (7.6, 3.1) -> (7.6, 8.9)
  line L14 (7.6, 6) -> (6.6, 6) construction
  line L15 (6.6, 6) -> (0, 6) construction
  line L16 (0, 6) -> (3.3, 6) construction
  line L17 (3.3, 6) -> (6.6, 6) construction
  circle A0 centre (6.6, 6) radius 0.25
  line L18 (0, 6) -> (1, 6)
  line L19 (1, 6) -> (6.6, 6) construction
  circle A1 centre (4.125, 6) radius 0.25
  circle A2 centre (1.65, 6) radius 0.25
  line L20 (0, 6) -> (0, 5.2231)
  circle A3 centre (-4.125, 6) radius 0.25
  circle A4 centre (-6.6, 6) radius 0.25
  circle A5 centre (-1.65, 6) radius 0.25
  line L21 (21.15, 0) -> (21.15, 38)
  line L22 (-21.15, 38) -> (-21.15, 0)
  line L23 (-21.15, 0) -> (-8.1, 0)
  dimension "d45" = 1
  dimension "d46" = 0.5
  dimension "d48" = 1
  dimension "d49" = 0.5
  dimension "d50" = 0.5
  dimension "d51" = 2.475
  dimension "d52" = 2.475
extrude "Extrude10" add sketch "Sketch6" along normal up to surface (10.5 mm away) contours A0 | A1 | A2 | A3 | A4 | A5
sketch "Sketch7" plane through (0, 21.15, 0) normal (0, 1, 0) x (-1, 0, 0)
  line L0 (-21.15, 0) -> (21.15, 0)
  line L1 (21.15, 0) -> (21.15, 38)
  line L2 (21.15, 38) -> (-21.15, 38)
  line L3 (-21.15, 38) -> (-21.15, 0)
  line L4 (0, 0) -> (0, 8) construction
  line L5 (0, 8) -> (-21.15, 8)
  line L6 (-21.15, 8) -> (-21.15, 0)
  line L7 (0, 8) -> (21.15, 8)
  line L8 (21.15, 8) -> (21.15, 0)
  line L9 (0, 0) -> (0, 38) construction
  line L10 (0, 19) -> (2, 19)
  line L11 (0, 38) -> (0, 30) construction
  line L12 (0, 30) -> (21.15, 30)
  line L13 (21.15, 30) -> (21.15, 38)
  line L14 (0, 30) -> (-21.15, 30)
  line L15 (-21.15, 30) -> (-21.15, 38)
  dimension "d55" = 8
  dimension "d56" = 8
extrude "Extrude11" add sketch "Sketch7" along normal blind 0.01 contours L0 L1 L3 L5 L6 L7 L8 | L1 L2 L3 L12 L13 L14 L15
sketch "Sketch8" plane through (0, -21.15, 0) normal (0, -1, 0) x (1, 0, 0)
  circle A0 centre (-6.6, 6) radius 0.25
  circle A1 centre (4.125, 6) radius 0.25
  circle A2 centre (1.65, 6) radius 0.25
  circle A3 centre (-4.125, 6) radius 0.25
  circle A4 centre (6.6, 6) radius 0.25
  circle A5 centre (-1.65, 6) radius 0.25
  line L0 (-8.1, 0) -> (-8.1, 9.4)
  line L1 (-8.1, 9.4) -> (-4.5, 9.4)
  line L2 (-4.5, 9.4) -> (-4.5, 8.9)
  line L3 (-4.5, 8.9) -> (-7.6, 8.9)
  line L4 (-7.6, 8.9) -> (-7.6, 3.1)
  line L5 (-7.6, 3.1) -> (7.6, 3.1)
  line L6 (7.6, 3.1) -> (7.6, 8.9)
  line L7 (7.6, 8.9) -> (4.5, 8.9)
  line L8 (4.5, 8.9) -> (4.5, 9.4)
  line L9 (4.5, 9.4) -> (8.1, 9.4)
  line L10 (8.1, 9.4) -> (8.1, 0)
  line L11 (8.1, 0) -> (21.15, 0)
  line L12 (21.15, 0) -> (21.15, 38)
  line L13 (21.15, 38) -> (-21.15, 38)
  line L14 (-21.15, 38) -> (-21.15, 0)
  line L15 (-21.15, 0) -> (-8.1, 0)
  line L16 (-21.15, 38) -> (-21.15, 30)
  line L17 (-21.15, 30) -> (21.15, 30)
  line L18 (21.15, 30) -> (21.15, 38)
  line L19 (0, 38) -> (0, 0) construction
  line L20 (0, 0) -> (0, 19) construction
  line L21 (2.7667, 19) -> (0, 19)
  line L22 (-21.15, 0) -> (-21.15, 8)
  line L23 (21.15, 8) -> (21.15, 0)
  line L24 (-21.15, 8) -> (21.15, 8)
  dimension "d59" = 8
  dimension "d60" = 8
extrude "Extrude12" add sketch "Sketch8" along normal blind 0.01 contours L0 L14 L15 L22 L24 | L12 L13 L14 L16 L17 L18 | L10 L11 L12 L23 L24
sketch "Sketch9" plane through (21.15, 0, 0) normal (1, 0, 0) x (0, 1, 0)
  line L0 (-21.16, 0) -> (21.16, 0)
  line L1 (21.16, 0) -> (21.16, 8)
  line L2 (21.16, 8) -> (21.15, 8)
  line L3 (21.15, 8) -> (21.15, 30)
  line L4 (21.15, 30) -> (21.16, 30)
  line L5 (21.16, 30) -> (21.16, 38)
  line L6 (21.16, 38) -> (-21.16, 38)
  line L7 (-21.16, 38) -> (-21.16, 30)
  line L8 (-21.16, 30) -> (-21.15, 30)
  line L9 (-21.15, 30) -> (-21.15, 8)
  line L10 (-21.15, 8) -> (-21.16, 8)
  line L11 (-21.16, 8) -> (-21.16, 0)
  line L12 (21.16, 30) -> (-21.16, 30)
  line L13 (-21.16, 8) -> (21.15, 8)
sketch "Sketch10" plane through (-21.15, 0, 0) normal (-1, 0, 0) x (0, -1, 0)
  line L0 (-21.16, 0) -> (21.16, 0)
  line L1 (21.16, 0) -> (21.16, 8)
  line L2 (21.16, 8) -> (21.15, 8)
  line L3 (21.15, 8) -> (21.15, 30)
  line L4 (21.15, 30) -> (21.16, 30)
  line L5 (21.16, 30) -> (21.16, 38)
  line L6 (21.16, 38) -> (-21.16, 38)
  line L7 (-21.16, 38) -> (-21.16, 30)
  line L8 (-21.16, 30) -> (-21.15, 30)
  line L9 (-21.15, 30) -> (-21.15, 8)
  line L10 (-21.15, 8) -> (-21.16, 8)
  line L11 (-21.16, 8) -> (-21.16, 0)
  line L12 (21.15, 30) -> (-21.16, 30)
  line L13 (-21.15, 8) -> (21.16, 8)
extrude "Extrude13" cut sketch "Sketch10" against normal blind 0.01 contours L3 L9 L12 L13
extrude "Extrude14" cut sketch "Sketch9" against normal blind 0.01 contours L3 L9 L12 L13
chamfer "Chamfer4" distance 7 angle 45 1 edges at (-21.14, -21.15, 19)
chamfer "Chamfer5" distance 7 angle 45 3 edges at (21.14, -21.15, 19) (21.14, 21.15, 19) (-21.14, 21.15, 19)
chamfer "Chamfer6" distance 5.5 angle 45 8 edges at (-21.15, 21.16, 4) (-21.15, -21.16, 4) (-21.15, -21.16, 34) (-21.15, 21.16, 34) (21.15, 21.16, 4) (21.15, -21.16, 4) (21.15, -21.16, 34) (21.15, 21.16, 34)
